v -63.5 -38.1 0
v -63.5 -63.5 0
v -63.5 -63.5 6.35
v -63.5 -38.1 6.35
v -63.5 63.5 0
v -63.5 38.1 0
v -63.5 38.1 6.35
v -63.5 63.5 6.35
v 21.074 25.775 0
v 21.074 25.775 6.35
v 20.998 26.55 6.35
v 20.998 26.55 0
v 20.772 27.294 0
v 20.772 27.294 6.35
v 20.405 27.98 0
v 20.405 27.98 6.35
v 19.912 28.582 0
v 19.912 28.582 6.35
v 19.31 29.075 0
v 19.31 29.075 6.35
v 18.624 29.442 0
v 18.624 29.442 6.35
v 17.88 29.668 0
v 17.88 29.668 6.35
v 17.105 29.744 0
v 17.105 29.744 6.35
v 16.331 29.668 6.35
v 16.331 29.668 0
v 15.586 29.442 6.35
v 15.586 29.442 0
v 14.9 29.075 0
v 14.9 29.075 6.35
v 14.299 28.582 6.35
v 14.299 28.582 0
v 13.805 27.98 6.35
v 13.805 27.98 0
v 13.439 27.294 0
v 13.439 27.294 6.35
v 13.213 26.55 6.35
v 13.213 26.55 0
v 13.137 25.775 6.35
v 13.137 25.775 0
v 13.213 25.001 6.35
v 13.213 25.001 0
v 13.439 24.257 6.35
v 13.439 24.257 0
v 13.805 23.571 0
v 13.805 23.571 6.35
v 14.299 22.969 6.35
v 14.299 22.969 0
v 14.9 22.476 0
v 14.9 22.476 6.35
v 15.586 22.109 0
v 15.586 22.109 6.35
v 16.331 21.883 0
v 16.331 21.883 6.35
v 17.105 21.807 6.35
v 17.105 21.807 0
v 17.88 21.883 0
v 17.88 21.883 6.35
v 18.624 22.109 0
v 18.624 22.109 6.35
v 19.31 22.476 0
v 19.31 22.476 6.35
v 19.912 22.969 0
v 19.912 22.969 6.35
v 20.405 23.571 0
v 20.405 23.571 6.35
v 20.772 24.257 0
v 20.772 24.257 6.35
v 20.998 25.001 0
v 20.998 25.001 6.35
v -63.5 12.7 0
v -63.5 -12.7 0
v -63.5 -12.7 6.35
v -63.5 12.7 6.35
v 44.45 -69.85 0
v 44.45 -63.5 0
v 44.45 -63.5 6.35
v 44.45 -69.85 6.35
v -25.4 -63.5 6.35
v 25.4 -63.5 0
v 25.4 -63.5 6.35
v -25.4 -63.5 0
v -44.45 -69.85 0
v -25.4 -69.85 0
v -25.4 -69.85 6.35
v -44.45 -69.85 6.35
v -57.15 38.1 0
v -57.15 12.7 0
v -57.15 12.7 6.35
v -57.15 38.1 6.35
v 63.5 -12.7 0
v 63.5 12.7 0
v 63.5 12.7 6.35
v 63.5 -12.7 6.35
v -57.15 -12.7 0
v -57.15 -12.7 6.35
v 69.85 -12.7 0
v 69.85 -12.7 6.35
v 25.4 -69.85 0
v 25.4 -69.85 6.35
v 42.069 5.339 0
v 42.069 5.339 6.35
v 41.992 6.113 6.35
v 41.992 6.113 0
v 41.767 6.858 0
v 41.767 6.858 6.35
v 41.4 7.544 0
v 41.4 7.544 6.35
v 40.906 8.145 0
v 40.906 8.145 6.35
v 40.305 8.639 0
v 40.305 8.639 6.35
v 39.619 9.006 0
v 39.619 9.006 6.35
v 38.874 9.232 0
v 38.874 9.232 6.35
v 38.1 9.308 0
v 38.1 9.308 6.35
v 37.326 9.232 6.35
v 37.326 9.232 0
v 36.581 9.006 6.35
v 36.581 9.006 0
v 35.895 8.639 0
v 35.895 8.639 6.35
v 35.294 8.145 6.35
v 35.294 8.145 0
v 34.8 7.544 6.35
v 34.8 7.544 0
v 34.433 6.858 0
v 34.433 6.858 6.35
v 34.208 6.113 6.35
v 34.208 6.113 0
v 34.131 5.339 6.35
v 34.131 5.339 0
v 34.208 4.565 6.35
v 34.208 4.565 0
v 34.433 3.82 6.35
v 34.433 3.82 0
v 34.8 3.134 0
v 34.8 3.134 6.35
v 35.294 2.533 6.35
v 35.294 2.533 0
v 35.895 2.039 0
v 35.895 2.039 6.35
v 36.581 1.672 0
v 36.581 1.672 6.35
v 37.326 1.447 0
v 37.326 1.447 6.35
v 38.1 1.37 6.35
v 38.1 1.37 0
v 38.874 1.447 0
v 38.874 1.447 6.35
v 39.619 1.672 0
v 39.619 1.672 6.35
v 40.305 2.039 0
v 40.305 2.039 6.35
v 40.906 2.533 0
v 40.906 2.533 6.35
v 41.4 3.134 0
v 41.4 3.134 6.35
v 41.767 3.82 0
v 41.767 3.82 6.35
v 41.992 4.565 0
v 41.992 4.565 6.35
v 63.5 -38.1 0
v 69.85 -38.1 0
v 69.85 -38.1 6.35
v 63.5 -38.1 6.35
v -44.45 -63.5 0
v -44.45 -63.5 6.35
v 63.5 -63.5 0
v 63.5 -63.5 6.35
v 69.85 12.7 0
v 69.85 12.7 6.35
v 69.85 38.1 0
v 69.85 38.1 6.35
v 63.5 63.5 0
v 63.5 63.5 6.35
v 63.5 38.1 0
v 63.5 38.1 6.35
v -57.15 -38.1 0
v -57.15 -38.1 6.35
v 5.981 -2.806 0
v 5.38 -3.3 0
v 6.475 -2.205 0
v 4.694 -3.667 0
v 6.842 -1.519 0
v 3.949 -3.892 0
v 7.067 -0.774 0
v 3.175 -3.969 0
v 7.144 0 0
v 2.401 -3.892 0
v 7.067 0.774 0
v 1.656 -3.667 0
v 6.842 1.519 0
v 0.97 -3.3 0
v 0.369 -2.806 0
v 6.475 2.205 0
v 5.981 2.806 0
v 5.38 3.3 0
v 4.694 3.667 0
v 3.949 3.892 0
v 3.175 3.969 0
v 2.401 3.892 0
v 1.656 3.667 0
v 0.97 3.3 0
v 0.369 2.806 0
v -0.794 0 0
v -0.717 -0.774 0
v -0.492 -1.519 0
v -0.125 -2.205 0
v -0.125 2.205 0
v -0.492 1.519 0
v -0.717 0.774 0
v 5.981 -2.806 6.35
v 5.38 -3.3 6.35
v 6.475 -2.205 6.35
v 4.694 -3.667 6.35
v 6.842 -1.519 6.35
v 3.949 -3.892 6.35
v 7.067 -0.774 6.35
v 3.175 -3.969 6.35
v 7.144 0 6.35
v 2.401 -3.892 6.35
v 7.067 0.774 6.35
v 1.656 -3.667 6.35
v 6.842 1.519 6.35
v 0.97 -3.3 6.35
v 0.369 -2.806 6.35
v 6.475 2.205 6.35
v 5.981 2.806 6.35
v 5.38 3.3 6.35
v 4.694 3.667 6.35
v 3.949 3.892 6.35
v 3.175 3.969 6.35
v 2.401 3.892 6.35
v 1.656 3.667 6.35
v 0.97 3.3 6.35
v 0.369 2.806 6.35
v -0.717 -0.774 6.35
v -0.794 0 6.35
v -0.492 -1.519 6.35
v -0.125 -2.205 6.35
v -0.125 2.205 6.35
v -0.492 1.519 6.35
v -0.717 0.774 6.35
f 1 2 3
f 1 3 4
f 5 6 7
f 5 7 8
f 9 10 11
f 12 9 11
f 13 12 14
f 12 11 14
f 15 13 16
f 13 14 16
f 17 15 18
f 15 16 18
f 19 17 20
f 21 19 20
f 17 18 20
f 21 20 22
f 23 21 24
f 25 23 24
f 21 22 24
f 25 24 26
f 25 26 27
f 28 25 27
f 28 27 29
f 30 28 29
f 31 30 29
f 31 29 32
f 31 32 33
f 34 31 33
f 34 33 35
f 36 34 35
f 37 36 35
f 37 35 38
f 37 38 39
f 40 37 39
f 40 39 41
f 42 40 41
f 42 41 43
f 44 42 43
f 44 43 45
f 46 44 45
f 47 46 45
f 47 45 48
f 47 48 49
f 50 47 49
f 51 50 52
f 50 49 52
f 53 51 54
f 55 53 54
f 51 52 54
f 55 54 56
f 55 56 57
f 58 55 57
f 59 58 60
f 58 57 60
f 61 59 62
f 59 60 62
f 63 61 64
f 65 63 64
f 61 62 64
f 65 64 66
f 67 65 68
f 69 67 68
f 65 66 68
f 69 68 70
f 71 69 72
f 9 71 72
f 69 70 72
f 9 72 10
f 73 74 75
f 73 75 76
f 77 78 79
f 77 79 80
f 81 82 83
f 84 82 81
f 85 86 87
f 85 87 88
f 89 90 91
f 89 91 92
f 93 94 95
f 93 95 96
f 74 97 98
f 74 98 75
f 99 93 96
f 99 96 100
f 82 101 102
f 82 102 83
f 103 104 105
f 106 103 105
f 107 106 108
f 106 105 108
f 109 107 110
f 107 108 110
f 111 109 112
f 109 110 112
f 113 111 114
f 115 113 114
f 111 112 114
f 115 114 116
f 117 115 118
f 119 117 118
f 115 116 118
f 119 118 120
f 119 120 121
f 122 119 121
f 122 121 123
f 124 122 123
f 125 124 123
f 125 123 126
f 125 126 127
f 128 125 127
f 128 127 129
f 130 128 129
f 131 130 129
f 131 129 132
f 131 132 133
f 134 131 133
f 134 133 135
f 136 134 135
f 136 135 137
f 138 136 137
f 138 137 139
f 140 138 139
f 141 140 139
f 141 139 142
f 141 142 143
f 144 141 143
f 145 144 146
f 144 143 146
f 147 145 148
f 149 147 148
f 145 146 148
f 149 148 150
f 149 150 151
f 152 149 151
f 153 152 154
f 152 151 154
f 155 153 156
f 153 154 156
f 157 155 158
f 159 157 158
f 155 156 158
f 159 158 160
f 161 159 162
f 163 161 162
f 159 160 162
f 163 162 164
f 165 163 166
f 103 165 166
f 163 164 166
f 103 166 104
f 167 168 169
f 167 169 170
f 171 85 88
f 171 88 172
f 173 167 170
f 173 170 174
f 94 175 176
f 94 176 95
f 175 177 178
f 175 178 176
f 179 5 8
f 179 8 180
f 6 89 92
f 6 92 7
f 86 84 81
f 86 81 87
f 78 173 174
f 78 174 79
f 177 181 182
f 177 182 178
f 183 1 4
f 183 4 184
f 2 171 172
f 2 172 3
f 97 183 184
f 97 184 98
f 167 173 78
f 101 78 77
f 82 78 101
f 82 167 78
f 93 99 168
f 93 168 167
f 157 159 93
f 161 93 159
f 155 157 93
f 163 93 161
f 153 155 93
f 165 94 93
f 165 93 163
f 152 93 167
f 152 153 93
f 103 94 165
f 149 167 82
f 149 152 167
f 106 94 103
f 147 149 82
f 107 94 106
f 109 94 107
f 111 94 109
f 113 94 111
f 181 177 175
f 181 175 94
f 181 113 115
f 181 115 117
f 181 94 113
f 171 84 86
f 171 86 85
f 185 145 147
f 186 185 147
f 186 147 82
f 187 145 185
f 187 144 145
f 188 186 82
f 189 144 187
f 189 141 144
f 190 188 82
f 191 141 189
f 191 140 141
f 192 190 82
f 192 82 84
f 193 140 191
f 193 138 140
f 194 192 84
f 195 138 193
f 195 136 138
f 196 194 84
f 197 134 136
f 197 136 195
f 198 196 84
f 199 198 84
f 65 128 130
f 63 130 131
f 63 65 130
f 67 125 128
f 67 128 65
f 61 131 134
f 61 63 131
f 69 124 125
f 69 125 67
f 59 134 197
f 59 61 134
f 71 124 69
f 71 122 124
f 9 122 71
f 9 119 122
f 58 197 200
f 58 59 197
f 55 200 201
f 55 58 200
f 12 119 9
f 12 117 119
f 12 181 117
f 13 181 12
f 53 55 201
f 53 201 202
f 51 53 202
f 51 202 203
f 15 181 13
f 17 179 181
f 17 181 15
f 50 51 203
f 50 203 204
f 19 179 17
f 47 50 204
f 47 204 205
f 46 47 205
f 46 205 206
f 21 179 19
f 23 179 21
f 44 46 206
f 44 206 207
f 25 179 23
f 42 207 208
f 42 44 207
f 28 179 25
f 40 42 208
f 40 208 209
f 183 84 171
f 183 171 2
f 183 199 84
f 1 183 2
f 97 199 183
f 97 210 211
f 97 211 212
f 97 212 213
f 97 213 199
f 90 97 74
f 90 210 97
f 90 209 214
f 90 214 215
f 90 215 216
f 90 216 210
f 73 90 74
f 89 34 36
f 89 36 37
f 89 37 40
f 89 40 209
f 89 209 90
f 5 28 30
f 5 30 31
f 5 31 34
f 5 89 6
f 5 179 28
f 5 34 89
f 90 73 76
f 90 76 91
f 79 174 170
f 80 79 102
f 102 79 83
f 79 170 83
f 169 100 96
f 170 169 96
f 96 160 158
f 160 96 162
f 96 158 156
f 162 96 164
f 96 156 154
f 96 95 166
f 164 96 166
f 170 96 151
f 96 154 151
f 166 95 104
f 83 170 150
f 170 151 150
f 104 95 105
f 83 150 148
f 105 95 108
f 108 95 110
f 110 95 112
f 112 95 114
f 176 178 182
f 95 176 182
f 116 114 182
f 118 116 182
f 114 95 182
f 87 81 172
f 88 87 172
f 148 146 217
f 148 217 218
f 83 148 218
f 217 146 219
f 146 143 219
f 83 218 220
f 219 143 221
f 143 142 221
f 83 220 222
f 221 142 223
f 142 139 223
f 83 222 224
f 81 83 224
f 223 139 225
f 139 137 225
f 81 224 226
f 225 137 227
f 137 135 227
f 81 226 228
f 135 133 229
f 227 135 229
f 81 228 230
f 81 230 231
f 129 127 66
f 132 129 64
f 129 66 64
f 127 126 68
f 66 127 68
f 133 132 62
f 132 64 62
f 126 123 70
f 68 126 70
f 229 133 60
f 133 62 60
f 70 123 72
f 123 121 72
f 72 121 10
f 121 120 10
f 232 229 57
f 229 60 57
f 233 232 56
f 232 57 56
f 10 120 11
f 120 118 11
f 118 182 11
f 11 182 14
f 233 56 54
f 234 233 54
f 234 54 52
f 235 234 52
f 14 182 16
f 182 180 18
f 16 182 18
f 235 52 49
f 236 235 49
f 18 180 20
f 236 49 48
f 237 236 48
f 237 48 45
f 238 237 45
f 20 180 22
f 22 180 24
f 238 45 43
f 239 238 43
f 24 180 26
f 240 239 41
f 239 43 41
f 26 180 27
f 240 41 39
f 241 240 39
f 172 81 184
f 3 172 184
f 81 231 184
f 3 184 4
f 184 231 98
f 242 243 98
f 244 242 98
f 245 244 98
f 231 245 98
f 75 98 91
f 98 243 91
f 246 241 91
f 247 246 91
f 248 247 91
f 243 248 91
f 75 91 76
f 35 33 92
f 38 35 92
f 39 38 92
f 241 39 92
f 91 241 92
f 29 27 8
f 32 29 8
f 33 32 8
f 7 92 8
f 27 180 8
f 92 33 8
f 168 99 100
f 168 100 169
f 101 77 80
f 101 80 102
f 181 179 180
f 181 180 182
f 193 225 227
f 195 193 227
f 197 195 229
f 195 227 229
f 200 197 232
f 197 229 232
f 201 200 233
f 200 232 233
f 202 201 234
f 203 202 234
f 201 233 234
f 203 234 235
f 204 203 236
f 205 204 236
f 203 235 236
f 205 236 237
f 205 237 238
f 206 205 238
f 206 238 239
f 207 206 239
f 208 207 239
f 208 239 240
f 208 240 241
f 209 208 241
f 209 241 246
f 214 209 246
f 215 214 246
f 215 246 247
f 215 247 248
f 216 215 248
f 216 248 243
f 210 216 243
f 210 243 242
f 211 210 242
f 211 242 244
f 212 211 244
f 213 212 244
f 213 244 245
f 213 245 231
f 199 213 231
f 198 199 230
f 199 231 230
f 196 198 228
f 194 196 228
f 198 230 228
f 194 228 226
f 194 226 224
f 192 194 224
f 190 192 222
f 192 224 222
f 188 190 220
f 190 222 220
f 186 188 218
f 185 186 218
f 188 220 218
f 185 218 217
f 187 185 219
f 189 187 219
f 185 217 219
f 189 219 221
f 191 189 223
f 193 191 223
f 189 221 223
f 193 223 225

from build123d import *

# Parameters (mm, degrees)
BOXSIDE_DEPTH      = 6.35
SKETCH2_R          = 3.96875
CUT_EXTRUDE1_DEPTH = 99.986703653


with BuildPart() as part:
    # Sketch1 → BOXSIDE (new body)
    with BuildSketch(Plane.XY):
        Polygon((-63.5, 38.1), (-63.5, 63.5), (63.5, 63.5), (63.5, 38.1), (69.85, 38.1), (69.85, 12.7), (63.5, 12.7), (63.5, -12.7), (69.85, -12.7), (69.85, -38.1), (63.5, -38.1), (63.5, -63.5), (44.45, -63.5), (44.45, -69.85), (25.4, -69.85), (25.4, -63.5), (-25.4, -63.5), (-25.4, -69.85), (-44.45, -69.85), (-44.45, -63.5), (-63.5, -63.5), (-63.5, -38.1), (-57.15, -38.1), (-57.15, -12.7), (-63.5, -12.7), (-63.5, 12.7), (-57.15, 12.7), (-57.15, 38.1), align=None)
    extrude(amount=BOXSIDE_DEPTH)

    # Sketch2 → Cut-Extrude1 (cut, through all)
    with BuildSketch(Plane.XY.offset(6.35)):
        with Locations((3.175, 0)):
            Circle(SKETCH2_R)
        with Locations((38.1, 5.339056325)):
            Circle(SKETCH2_R)
        with Locations((17.105250883, 25.77544668)):
            Circle(SKETCH2_R)
    extrude(amount=-CUT_EXTRUDE1_DEPTH, mode=Mode.SUBTRACT)


solid = part.part
